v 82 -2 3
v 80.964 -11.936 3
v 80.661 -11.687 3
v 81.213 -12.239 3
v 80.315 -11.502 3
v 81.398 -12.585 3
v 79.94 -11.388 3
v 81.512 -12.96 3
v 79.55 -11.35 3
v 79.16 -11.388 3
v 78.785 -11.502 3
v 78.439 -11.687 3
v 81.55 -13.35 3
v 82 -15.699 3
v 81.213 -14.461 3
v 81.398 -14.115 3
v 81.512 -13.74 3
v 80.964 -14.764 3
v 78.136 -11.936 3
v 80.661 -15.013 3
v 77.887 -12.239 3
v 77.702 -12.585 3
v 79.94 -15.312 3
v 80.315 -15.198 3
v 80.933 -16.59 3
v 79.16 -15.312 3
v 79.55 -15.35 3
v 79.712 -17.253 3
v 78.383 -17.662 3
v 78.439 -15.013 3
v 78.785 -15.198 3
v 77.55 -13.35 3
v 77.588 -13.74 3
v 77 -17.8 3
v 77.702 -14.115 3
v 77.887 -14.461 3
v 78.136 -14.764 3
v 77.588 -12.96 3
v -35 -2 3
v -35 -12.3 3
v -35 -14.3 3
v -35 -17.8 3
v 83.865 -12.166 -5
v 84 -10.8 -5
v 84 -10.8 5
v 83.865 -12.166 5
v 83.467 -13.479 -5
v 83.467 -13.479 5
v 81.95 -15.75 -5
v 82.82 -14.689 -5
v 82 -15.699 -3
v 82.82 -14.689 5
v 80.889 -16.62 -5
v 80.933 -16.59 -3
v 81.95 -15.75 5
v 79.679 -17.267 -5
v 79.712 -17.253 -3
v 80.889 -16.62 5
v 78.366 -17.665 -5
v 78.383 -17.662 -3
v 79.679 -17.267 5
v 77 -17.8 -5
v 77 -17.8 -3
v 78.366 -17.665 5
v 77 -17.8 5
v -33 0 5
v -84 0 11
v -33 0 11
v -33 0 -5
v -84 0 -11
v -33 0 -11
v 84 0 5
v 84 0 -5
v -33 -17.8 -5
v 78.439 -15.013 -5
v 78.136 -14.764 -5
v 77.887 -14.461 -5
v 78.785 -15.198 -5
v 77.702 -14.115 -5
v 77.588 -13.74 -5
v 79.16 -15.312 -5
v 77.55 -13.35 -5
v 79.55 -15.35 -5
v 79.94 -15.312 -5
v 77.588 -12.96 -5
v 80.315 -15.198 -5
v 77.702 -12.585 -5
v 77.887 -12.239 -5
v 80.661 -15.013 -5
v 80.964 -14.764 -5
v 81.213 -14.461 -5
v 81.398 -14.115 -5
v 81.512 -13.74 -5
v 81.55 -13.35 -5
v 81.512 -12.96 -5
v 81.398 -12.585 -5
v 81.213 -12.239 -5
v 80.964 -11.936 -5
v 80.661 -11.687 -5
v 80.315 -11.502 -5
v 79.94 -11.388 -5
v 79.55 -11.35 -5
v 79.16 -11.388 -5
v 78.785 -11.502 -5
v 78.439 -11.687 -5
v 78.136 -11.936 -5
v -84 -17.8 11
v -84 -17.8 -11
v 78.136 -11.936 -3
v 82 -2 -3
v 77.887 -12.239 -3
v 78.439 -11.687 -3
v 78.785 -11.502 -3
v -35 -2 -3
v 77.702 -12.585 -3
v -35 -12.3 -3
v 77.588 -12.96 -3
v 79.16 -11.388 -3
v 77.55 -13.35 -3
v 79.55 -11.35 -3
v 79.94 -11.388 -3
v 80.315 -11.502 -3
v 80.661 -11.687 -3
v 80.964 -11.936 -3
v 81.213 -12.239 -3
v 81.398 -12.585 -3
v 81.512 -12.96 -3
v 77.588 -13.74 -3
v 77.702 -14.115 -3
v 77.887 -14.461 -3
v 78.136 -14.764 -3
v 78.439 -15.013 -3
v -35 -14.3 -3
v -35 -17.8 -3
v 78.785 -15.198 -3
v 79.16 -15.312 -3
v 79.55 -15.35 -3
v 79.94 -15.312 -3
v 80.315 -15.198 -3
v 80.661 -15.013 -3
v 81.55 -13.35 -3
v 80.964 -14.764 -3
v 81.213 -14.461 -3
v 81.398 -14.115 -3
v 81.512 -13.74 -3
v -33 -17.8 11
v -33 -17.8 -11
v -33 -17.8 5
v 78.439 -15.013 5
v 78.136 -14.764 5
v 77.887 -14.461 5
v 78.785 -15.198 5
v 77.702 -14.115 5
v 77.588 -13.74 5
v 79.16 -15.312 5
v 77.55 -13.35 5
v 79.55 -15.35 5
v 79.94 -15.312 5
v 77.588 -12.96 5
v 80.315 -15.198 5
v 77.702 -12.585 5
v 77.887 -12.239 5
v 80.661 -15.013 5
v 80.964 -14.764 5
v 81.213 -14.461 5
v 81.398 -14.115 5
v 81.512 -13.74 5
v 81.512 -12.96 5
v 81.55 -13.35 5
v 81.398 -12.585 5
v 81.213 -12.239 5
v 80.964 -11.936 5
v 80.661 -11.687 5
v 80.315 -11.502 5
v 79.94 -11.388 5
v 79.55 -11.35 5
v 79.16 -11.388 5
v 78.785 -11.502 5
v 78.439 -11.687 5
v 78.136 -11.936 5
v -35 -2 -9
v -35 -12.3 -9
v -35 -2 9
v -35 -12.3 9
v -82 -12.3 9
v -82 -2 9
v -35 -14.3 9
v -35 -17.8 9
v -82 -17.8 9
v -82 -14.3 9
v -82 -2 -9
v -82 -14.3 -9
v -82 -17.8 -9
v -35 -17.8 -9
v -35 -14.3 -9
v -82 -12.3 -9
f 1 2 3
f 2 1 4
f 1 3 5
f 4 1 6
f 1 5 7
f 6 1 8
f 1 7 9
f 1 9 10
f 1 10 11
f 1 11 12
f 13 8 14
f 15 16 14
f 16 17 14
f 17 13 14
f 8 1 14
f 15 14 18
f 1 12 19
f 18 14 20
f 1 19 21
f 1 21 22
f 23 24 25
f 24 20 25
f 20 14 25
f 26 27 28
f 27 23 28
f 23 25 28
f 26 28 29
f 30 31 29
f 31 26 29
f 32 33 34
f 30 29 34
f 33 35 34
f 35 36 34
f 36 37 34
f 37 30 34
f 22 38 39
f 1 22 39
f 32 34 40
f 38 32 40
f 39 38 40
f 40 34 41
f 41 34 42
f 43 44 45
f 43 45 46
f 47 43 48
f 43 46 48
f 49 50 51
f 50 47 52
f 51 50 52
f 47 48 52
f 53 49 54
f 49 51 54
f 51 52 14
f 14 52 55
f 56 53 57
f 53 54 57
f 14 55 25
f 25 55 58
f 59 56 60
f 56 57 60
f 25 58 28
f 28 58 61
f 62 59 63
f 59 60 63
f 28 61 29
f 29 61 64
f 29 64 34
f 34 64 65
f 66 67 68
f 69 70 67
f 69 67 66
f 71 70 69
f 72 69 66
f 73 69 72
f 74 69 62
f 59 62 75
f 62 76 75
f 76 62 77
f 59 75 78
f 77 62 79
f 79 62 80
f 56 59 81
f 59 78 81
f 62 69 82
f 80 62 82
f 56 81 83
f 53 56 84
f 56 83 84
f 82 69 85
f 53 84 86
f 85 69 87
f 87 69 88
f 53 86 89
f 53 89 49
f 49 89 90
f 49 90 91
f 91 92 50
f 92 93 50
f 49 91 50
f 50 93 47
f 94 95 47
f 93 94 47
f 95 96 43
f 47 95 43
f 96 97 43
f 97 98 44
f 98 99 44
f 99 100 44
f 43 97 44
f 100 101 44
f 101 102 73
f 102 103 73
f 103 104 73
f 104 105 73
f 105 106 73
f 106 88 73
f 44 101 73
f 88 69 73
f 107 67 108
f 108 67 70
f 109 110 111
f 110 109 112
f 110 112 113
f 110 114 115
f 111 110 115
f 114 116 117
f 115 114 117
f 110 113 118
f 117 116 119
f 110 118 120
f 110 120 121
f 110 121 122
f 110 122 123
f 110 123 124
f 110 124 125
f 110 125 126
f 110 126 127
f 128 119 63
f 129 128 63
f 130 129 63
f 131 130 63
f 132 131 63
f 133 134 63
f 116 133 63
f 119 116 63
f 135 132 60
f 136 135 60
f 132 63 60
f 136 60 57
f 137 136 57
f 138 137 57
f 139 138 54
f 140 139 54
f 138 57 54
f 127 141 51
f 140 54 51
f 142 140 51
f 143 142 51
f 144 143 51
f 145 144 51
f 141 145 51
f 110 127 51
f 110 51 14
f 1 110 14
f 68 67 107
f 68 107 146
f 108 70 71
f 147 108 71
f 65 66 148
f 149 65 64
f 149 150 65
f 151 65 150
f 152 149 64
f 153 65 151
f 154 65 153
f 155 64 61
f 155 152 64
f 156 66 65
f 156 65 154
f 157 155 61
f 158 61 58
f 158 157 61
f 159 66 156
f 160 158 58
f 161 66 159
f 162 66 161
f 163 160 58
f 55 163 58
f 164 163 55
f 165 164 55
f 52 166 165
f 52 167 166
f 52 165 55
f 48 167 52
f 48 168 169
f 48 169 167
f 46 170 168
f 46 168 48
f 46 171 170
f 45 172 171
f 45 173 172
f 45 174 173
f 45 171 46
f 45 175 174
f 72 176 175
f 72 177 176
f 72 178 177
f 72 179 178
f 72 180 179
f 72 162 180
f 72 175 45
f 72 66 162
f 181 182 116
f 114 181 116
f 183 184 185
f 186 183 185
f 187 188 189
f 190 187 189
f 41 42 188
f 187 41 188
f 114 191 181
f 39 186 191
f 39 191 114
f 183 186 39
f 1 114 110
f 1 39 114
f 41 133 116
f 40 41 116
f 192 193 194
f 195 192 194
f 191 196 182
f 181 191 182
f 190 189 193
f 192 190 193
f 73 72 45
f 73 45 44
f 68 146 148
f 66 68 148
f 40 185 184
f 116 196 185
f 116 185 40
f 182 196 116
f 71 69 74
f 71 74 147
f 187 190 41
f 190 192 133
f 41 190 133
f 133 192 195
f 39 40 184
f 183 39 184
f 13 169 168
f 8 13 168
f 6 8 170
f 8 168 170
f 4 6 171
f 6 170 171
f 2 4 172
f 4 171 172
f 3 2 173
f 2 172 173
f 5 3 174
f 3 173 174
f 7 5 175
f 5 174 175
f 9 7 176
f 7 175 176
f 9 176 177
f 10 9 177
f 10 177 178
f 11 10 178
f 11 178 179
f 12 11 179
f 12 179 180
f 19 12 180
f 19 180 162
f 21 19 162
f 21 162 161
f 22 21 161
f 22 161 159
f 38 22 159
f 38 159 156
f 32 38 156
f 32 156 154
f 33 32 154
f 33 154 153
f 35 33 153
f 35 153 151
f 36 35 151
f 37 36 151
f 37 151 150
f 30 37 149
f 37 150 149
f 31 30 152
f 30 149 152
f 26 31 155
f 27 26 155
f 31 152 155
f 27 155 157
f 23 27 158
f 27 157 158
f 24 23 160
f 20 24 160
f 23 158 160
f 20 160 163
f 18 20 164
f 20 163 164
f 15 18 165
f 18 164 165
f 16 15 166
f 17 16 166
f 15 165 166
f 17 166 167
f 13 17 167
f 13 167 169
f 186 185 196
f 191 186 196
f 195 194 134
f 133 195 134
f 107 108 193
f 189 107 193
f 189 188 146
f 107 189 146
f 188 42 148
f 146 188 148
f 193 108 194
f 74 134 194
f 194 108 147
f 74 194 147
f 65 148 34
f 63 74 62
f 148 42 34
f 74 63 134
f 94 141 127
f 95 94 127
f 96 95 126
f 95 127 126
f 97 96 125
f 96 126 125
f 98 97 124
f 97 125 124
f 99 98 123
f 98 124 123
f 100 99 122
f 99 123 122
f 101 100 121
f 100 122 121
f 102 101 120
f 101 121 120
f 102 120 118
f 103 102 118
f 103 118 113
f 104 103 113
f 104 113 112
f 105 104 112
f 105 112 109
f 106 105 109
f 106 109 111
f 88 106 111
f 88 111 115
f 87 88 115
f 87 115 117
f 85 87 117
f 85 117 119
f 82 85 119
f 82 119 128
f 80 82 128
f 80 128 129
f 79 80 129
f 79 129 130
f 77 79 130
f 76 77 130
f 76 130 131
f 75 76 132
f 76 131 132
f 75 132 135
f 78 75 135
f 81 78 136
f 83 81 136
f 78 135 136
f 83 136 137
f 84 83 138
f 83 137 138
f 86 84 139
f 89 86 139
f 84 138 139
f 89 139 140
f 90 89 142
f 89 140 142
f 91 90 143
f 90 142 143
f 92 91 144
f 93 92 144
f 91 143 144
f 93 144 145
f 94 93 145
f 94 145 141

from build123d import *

# Parameters (mm, degrees)
SKETCH1_W           = 168
SKETCH1_H           = 22
BOSS_EXTRUDE1_DEPTH = 17.8
SKETCH8_R           = 2
CUT_EXTRUDE4_DEPTH  = 22
CUT_EXTRUDE2_REACH  = 88.567
SKETCH5_W           = 117
SKETCH5_H           = 6
CUT_EXTRUDE3_DEPTH  = 15.8
BOSS_EXTRUDE3_REACH = 90.164
SKETCH7_W           = 47
SKETCH7_H           = 2
FILLET1_R           = 7


with BuildPart() as part:
    # Sketch1 → Boss-Extrude1 (new body)
    with BuildSketch(Plane(origin=(0, 0, 0), x_dir=(1, 0, 0), z_dir=(0, 1, 0))):
        Rectangle(SKETCH1_W, SKETCH1_H)
    extrude(amount=-BOSS_EXTRUDE1_DEPTH)

    # Sketch8 → Cut-Extrude4 (cut)
    with BuildSketch(Plane.XY.offset(11)):
        with Locations((79.55, -13.35)):
            Circle(SKETCH8_R)
    extrude(amount=-CUT_EXTRUDE4_DEPTH, mode=Mode.SUBTRACT)

    # Cut-Extrude2: up to this face of the body (flat: up to its plane)
    cut_extrude2_end = Plane(part.part.faces().sort_by_distance((0, -17.8, 0))[0])
    # Sketch5 → Cut-Extrude2 (cut, up to the picked face)
    with BuildSketch(Plane(origin=(0, 0, 0), x_dir=(1, 0, 0), z_dir=(0, 1, 0)), mode=Mode.PRIVATE) as cut_extrude2_sk1:
        with Locations((25.5, 8)):
            Rectangle(SKETCH5_W, SKETCH5_H)
    cut_extrude2_tool1 = split(extrude(cut_extrude2_sk1.sketch, amount=-CUT_EXTRUDE2_REACH, mode=Mode.PRIVATE), bisect_by=cut_extrude2_end, keep=Keep.BOTH, mode=Mode.PRIVATE)
    # Sketch5 → Cut-Extrude2 (cut, up to the picked face)
    with BuildSketch(Plane(origin=(0, 0, 0), x_dir=(1, 0, 0), z_dir=(0, 1, 0)), mode=Mode.PRIVATE) as cut_extrude2_sk2:
        with Locations((25.5, -8)):
            Rectangle(SKETCH5_W, SKETCH5_H)
    cut_extrude2_tool2 = split(extrude(cut_extrude2_sk2.sketch, amount=-CUT_EXTRUDE2_REACH, mode=Mode.PRIVATE), bisect_by=cut_extrude2_end, keep=Keep.BOTH, mode=Mode.PRIVATE)
    add(cut_extrude2_tool1.solids().sort_by(Axis((25.5, 0, -8), (0, -1, 0)))[0], mode=Mode.SUBTRACT)
    add(cut_extrude2_tool2.solids().sort_by(Axis((25.5, 0, 8), (0, -1, 0)))[0], mode=Mode.SUBTRACT)

    # Sketch6 → Cut-Extrude3 (cut)
    with BuildSketch(Plane.XZ.offset(17.8)):
        Polygon((-82, 9), (-82, -9), (-35, -9), (-35, -3), (82, -3), (82, 3), (-35, 3), (-35, 9), align=None)
    extrude(amount=-CUT_EXTRUDE3_DEPTH, mode=Mode.SUBTRACT)

    # Boss-Extrude3: up to this face of the body (flat: up to its plane)
    boss_extrude3_end = Plane(part.part.faces().sort_by_distance((-58.5, -9.9, 9))[0])
    # Sketch7 → Boss-Extrude3 (add, up to the picked face)
    with BuildSketch(Plane.XY.offset(-9), mode=Mode.PRIVATE) as boss_extrude3_sk1:
        with Locations((-58.5, -13.3)):
            Rectangle(SKETCH7_W, SKETCH7_H)
    boss_extrude3_tool1 = split(extrude(boss_extrude3_sk1.sketch, amount=BOSS_EXTRUDE3_REACH, mode=Mode.PRIVATE), bisect_by=boss_extrude3_end, keep=Keep.BOTH, mode=Mode.PRIVATE)
    add(boss_extrude3_tool1.solids().sort_by(Axis((-58.5, -13.3, -9), (0, 0, 1)))[0])

    # Fillet1
    # the kernel refuses this fillet: 7 mm, written as the material it takes off along each edge
    with BuildSketch(Plane(origin=(84, -17.8, 22.5), x_dir=(-1, 0, 0), z_dir=(0, 0, -1))) as fillet1_piece_1:
        with BuildLine():
            CenterArc((FILLET1_R, FILLET1_R), FILLET1_R, 180, 90)
            Line((0, FILLET1_R), (0, 0))
            Line((0, 0), (FILLET1_R, 0))
        make_face()
    extrude(amount=45, mode=Mode.SUBTRACT)


solid = part.part
